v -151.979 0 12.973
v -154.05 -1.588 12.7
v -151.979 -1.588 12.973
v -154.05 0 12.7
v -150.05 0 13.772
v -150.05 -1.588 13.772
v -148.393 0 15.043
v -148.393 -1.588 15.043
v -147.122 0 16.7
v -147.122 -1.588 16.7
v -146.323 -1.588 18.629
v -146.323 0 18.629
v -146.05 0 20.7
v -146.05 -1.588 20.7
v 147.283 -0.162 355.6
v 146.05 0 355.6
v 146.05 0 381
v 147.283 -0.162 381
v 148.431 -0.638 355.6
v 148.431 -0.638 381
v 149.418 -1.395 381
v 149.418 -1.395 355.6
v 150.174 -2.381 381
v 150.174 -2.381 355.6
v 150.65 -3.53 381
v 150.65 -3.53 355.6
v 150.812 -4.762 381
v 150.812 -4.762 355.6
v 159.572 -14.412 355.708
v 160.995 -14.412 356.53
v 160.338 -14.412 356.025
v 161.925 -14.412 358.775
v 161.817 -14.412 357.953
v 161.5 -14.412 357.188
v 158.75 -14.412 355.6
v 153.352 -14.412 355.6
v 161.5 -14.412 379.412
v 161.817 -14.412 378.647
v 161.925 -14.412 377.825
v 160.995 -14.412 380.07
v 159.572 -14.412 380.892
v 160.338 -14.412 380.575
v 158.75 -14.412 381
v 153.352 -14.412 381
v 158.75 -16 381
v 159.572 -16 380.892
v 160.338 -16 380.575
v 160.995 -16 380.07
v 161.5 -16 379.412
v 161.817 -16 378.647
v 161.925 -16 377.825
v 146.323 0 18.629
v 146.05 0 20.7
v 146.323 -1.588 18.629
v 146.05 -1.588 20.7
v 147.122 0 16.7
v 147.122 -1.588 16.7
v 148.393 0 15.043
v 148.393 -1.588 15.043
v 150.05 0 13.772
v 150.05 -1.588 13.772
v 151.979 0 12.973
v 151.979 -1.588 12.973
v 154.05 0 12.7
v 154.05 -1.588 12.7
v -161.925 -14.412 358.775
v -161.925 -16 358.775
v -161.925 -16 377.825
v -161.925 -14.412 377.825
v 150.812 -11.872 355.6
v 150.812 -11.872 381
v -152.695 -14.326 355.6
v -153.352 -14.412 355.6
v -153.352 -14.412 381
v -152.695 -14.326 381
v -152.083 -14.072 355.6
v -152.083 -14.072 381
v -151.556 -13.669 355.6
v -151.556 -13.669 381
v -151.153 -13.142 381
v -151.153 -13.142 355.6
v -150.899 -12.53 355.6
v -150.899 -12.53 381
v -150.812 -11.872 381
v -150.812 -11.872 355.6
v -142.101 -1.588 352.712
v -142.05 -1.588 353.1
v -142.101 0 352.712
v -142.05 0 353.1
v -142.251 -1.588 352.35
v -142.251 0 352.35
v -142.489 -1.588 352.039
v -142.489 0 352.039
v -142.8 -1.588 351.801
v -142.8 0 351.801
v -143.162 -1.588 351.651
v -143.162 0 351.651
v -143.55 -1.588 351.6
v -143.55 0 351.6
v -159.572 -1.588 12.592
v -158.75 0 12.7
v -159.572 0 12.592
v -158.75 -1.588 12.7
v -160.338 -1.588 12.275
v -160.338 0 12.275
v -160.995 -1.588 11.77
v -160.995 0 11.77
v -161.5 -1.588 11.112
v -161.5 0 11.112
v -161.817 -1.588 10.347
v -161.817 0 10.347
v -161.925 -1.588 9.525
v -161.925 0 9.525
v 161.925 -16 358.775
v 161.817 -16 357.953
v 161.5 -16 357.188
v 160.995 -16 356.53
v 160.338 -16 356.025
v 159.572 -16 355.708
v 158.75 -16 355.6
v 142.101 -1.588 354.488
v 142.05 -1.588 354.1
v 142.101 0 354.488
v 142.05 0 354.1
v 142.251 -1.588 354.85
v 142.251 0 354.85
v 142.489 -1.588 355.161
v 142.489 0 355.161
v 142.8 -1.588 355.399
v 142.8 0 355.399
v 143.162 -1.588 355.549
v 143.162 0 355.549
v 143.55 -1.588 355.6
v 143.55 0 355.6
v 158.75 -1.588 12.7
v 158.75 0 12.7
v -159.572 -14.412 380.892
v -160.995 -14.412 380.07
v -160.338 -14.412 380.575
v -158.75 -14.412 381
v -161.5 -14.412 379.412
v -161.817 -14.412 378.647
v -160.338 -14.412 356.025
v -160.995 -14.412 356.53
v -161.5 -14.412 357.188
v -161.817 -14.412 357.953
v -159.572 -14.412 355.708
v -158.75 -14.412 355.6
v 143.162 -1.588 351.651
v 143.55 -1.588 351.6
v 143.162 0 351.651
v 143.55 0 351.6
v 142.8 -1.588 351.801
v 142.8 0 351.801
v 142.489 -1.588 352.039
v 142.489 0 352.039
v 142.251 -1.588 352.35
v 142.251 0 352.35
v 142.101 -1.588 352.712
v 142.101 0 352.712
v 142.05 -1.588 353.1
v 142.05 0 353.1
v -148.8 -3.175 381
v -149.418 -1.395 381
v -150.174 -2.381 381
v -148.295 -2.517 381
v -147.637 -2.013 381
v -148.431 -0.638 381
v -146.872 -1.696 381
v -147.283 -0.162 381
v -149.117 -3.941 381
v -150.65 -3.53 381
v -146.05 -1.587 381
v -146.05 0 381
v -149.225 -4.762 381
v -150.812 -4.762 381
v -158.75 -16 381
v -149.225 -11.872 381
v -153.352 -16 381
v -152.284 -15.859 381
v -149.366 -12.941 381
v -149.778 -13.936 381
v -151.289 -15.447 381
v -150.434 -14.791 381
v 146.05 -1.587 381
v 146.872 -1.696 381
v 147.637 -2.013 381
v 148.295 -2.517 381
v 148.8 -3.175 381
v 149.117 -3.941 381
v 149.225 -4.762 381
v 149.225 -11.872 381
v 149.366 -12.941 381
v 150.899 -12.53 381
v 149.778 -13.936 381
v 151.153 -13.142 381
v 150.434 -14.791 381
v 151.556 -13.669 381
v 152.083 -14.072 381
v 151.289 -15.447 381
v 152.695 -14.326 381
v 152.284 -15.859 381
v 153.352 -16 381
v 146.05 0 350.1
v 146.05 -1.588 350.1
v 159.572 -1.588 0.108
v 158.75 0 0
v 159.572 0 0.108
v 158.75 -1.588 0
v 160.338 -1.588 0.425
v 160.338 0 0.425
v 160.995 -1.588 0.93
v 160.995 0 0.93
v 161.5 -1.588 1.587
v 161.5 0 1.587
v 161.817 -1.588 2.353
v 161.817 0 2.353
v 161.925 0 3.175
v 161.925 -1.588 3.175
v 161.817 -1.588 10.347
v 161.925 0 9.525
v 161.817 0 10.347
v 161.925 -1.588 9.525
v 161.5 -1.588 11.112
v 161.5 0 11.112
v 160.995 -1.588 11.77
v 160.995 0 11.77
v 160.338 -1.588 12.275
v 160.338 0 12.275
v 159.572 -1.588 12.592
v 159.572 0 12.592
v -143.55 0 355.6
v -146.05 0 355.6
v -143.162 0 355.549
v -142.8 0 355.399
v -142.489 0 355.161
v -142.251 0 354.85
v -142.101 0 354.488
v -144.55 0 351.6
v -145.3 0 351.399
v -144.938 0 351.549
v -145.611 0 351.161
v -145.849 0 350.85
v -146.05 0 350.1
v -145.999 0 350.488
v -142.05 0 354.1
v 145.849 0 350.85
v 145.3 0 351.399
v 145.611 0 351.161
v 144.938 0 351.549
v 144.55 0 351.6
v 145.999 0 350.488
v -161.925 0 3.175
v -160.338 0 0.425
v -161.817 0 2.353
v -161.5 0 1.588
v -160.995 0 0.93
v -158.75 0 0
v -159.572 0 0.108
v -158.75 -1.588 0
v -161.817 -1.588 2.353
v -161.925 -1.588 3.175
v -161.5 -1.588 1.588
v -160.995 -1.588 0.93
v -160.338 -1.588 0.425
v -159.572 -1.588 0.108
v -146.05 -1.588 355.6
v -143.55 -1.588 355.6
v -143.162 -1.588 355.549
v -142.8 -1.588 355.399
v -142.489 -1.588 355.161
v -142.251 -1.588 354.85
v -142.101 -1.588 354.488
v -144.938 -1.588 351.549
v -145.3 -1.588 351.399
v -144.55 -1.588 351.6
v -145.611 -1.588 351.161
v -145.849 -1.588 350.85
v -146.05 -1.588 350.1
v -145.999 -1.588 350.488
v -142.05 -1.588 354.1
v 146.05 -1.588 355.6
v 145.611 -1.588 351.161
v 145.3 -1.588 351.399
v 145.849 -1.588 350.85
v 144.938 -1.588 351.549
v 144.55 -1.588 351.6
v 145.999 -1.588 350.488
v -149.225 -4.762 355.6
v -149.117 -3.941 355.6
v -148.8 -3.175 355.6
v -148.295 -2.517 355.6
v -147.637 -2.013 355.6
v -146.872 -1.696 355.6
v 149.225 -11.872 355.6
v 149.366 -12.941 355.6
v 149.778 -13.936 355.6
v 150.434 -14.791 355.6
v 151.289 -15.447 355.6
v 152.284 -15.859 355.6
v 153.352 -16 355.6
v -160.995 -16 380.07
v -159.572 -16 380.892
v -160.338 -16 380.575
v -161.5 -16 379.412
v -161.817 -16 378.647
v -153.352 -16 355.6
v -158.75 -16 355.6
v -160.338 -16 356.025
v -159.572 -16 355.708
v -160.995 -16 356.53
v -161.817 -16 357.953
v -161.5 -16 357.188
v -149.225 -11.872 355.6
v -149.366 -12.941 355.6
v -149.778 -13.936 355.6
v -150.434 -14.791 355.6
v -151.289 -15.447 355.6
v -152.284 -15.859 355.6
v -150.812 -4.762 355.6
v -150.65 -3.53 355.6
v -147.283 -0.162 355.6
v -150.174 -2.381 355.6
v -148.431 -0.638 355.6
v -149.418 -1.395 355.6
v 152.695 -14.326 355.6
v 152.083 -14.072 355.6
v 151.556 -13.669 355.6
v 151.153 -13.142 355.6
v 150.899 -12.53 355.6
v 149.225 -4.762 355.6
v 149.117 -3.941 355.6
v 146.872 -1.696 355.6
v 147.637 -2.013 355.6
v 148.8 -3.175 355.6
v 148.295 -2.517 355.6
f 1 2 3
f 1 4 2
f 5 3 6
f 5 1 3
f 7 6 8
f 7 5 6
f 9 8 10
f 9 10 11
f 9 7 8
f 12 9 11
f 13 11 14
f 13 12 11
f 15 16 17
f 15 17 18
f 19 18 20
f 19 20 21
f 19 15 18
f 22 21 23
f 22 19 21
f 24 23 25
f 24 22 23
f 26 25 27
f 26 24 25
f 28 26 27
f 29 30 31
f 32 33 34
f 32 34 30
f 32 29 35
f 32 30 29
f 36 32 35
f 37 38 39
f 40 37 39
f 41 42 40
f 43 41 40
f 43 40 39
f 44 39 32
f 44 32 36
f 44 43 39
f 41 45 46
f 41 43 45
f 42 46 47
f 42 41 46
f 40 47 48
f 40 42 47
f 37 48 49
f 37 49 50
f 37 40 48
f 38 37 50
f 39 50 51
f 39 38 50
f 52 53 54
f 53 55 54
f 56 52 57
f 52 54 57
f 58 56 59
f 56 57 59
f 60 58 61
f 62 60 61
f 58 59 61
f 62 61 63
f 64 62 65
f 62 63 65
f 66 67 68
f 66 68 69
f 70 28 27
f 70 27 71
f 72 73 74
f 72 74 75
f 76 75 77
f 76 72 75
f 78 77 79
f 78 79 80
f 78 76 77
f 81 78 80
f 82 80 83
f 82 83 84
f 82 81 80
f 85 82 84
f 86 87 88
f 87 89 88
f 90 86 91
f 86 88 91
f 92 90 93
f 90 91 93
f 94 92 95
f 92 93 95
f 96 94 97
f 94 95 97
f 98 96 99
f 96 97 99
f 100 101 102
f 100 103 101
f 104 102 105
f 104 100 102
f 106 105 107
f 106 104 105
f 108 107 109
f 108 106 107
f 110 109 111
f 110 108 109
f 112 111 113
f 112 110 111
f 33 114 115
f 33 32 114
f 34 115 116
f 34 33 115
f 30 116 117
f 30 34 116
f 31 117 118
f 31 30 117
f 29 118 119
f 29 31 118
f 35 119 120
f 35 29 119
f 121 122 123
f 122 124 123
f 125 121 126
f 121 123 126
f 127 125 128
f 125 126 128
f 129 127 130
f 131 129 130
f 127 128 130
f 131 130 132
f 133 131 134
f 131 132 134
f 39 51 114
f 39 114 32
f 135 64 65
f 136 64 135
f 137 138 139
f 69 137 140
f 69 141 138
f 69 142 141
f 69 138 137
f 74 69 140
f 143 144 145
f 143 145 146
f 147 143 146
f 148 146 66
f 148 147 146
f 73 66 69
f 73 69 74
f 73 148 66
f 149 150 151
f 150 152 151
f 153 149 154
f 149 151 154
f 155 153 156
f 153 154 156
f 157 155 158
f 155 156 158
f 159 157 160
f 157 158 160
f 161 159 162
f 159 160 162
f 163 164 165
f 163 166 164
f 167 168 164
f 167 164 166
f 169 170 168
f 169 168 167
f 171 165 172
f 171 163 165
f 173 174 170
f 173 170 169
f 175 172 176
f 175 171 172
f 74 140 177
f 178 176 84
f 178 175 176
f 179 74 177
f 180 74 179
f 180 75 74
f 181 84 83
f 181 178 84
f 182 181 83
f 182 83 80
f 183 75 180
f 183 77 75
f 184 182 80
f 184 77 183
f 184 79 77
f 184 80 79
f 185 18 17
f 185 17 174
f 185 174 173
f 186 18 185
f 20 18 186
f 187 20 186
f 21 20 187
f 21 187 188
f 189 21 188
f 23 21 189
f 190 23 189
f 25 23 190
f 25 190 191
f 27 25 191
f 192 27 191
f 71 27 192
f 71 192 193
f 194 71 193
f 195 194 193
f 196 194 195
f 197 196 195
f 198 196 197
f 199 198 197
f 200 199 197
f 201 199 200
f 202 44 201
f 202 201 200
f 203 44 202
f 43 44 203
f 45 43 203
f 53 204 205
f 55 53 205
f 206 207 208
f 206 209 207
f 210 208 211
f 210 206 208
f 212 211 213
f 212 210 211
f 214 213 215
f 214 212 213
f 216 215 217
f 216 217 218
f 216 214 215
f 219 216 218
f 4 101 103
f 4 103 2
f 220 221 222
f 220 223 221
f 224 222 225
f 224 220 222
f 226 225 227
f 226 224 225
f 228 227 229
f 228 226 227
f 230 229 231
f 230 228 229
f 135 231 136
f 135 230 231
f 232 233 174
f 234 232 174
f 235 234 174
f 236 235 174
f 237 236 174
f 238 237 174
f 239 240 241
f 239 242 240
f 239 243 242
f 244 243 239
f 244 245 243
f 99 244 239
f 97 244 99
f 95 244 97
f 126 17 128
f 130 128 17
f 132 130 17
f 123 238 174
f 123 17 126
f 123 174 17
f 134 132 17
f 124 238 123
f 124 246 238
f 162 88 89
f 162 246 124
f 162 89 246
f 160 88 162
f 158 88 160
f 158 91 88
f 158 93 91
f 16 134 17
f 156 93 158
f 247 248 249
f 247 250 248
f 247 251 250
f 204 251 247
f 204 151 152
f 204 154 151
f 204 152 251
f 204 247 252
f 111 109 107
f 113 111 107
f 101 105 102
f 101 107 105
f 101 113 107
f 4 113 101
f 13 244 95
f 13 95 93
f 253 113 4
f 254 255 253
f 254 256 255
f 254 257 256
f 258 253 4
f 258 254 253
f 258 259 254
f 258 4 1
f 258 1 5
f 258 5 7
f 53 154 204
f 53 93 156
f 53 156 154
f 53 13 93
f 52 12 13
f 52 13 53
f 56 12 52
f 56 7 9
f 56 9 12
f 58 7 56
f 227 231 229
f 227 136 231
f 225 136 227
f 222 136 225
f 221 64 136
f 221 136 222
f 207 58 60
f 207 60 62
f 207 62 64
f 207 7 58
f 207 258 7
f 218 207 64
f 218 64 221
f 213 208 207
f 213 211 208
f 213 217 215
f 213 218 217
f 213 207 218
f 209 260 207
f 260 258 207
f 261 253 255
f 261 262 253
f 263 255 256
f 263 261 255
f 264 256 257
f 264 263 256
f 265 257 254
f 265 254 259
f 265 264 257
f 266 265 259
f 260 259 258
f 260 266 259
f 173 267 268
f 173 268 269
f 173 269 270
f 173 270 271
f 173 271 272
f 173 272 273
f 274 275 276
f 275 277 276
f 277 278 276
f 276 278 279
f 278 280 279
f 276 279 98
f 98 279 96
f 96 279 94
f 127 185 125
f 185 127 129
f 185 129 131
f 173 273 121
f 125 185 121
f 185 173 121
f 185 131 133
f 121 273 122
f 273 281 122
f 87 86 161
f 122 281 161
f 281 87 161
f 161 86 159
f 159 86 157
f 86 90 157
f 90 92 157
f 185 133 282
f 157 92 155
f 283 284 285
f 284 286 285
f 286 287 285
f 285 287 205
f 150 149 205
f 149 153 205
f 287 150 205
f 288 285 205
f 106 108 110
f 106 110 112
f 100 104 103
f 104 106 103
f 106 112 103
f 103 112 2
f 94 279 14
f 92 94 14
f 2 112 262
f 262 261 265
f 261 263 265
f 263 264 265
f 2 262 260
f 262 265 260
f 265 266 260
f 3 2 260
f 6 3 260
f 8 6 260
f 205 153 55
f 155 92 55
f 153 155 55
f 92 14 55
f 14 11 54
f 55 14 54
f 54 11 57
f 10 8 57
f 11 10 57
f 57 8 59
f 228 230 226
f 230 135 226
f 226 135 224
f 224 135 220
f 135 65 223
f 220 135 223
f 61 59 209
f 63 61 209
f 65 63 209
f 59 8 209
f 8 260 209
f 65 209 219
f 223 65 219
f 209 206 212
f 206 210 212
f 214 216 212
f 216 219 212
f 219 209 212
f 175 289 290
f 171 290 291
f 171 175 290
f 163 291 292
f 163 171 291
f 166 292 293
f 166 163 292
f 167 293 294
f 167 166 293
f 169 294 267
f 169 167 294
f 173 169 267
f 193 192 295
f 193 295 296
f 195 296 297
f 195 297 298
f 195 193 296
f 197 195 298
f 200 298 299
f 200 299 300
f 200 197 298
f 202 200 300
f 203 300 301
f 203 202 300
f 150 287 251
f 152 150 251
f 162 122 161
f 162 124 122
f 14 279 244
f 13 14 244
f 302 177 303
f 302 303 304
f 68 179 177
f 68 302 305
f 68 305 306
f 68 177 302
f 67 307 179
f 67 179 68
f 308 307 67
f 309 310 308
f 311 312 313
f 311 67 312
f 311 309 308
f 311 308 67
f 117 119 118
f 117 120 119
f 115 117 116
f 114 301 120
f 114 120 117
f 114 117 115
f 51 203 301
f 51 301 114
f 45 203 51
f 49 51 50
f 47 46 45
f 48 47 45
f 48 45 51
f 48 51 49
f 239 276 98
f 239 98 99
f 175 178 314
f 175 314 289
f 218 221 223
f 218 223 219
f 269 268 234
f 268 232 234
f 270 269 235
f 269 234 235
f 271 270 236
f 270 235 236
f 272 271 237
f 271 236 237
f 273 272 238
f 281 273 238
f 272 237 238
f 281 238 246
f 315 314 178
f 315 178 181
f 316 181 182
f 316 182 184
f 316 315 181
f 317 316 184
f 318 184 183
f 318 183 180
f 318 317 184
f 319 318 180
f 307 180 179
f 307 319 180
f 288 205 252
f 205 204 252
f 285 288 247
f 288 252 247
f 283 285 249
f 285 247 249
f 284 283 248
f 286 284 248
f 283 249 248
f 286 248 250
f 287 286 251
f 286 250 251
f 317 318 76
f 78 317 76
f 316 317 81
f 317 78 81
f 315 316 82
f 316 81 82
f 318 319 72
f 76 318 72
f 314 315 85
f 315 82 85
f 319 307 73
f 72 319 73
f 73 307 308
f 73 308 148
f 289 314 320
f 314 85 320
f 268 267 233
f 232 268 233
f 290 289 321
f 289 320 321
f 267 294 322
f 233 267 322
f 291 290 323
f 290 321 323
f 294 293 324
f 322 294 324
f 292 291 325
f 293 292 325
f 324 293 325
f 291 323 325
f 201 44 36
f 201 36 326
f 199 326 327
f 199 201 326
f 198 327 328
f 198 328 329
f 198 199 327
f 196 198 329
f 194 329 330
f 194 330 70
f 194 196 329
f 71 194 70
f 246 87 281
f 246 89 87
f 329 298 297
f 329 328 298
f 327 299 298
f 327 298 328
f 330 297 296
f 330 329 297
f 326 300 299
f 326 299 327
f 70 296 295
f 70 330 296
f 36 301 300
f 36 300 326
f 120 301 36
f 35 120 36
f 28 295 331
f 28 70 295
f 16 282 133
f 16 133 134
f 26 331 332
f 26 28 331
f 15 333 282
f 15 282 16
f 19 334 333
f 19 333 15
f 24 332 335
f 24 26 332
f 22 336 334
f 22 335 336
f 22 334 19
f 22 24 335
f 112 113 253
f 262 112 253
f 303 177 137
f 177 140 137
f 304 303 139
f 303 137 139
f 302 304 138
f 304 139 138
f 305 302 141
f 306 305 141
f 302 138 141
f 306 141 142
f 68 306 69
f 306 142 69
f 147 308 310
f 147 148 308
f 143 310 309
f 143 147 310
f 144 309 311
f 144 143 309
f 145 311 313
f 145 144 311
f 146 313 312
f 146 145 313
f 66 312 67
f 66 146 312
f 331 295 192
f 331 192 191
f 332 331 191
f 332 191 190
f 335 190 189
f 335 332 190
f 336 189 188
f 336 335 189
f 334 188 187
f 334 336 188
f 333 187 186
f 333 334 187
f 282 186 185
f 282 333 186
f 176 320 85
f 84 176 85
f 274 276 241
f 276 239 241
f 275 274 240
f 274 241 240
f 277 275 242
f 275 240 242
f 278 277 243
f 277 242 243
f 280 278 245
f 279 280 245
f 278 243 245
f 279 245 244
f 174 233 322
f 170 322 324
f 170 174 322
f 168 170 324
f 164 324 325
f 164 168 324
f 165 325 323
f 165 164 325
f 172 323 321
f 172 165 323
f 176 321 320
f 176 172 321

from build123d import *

# Parameters (mm, degrees)
SKETCH5_W                      = 301.625
SKETCH5_H                      = 1.5875
BASE_FLANGE1_DEPTH             = 381
SKETCH10_W                     = 11.1125
SKETCH10_H                     = 12.7
BOSS_EXTRUDE1_DEPTH            = 1.5875
EDGE_FLANGE1_STRIP_W           = 12.7
EDGE_FLANGE1_STRIP_H           = 1.5875
EDGE_FLANGE1_STRIP_CUT_DEPTH   = 368.3
EDGE_FLANGE1_STRIP_2_W         = 12.7
EDGE_FLANGE1_STRIP_2_H         = 1.5875
EDGE_FLANGE1_STRIP_CUT_2_DEPTH = 368.3
EDGE_FLANGE1_DEPTH             = 368.3
EDGE_FLANGE1_BEND_DEPTH        = 368.3
CUT_EXTRUDE1_START             = -25.4
CUT_EXTRUDE1_DEPTH             = 342.9
EDGE_FLANGE2_STRIP_W           = 11.43
EDGE_FLANGE2_STRIP_H           = 1.5875
EDGE_FLANGE2_STRIP_CUT_DEPTH   = 25.4
EDGE_FLANGE2_DEPTH             = 25.4
EDGE_FLANGE3_STRIP_W           = 11.43
EDGE_FLANGE3_STRIP_H           = 1.5875
EDGE_FLANGE3_STRIP_CUT_DEPTH   = 25.4
EDGE_FLANGE3_DEPTH             = 25.4
FILLET1_R                      = 8
FILLET2_R                      = 3.175
SKETCH30_W                     = 4
SKETCH30_H                     = 1.5875
CUT_EXTRUDE9_DEPTH             = 4
SKETCH31_W                     = 4
SKETCH31_H                     = 1.5875
CUT_EXTRUDE10_DEPTH            = 4
FILLET4_R                      = 1.5


# Sheet-metal steps are written as plain solids
with BuildPart() as part:
    # Sketch5 → Base-Flange1 (new body)
    with BuildSketch(Plane.XY):
        with Locations((0, -0.79375)):
            Rectangle(SKETCH5_W, SKETCH5_H)
    extrude(amount=BASE_FLANGE1_DEPTH)

    # Sketch10 → Boss-Extrude1 (add)
    with BuildSketch(Plane(origin=(0, 0, 0), x_dir=(1, 0, 0), z_dir=(0, 1, 0))):
        with Locations((-156.36875, -6.35)):
            Rectangle(SKETCH10_W, SKETCH10_H)
        with Locations((156.36875, -6.35)):
            Rectangle(SKETCH10_W, SKETCH10_H)
    extrude(amount=-BOSS_EXTRUDE1_DEPTH)

    # Edge-Flange1 strip (across the edge) → Edge-Flange1 strip cut (cut)
    with BuildSketch(Plane(origin=(150.8125, -1.5875, 12.7), x_dir=(-1, 0, 0), z_dir=(0, 0, 1))):
        with Locations((-1.5875, -0.79375)):
            Rectangle(EDGE_FLANGE1_STRIP_W, EDGE_FLANGE1_STRIP_H)
    extrude(amount=EDGE_FLANGE1_STRIP_CUT_DEPTH, mode=Mode.SUBTRACT)

    # Edge-Flange1 strip 2 (across the edge) → Edge-Flange1 strip cut 2 (cut)
    with BuildSketch(Plane(origin=(-150.8125, -1.5875, 381), x_dir=(1, 0, 0), z_dir=(0, 0, -1))):
        with Locations((-1.5875, -0.79375)):
            Rectangle(EDGE_FLANGE1_STRIP_2_W, EDGE_FLANGE1_STRIP_2_H)
    extrude(amount=EDGE_FLANGE1_STRIP_CUT_2_DEPTH, mode=Mode.SUBTRACT)

    # Edge-Flange1 section (across the edge) → Edge-Flange1 (add)
    with BuildSketch(Plane(origin=(150.8125, -1.5875, 12.7), x_dir=(-1, 0, 0), z_dir=(0, 0, 1))):
        with BuildLine():
            Line((0, 3.175), (0, 14.4125))
            Line((0, 14.4125), (1.5875, 14.4125))
            Line((1.5875, 14.4125), (1.5875, 3.175))
            ThreePointArc((1.5875, 3.175), (2.51743597, 0.92993597), (4.7625, 0))
            Line((4.7625, 0), (4.7625, -1.5875))
            ThreePointArc((4.7625, -1.5875), (1.394903955, -0.192596045), (0, 3.175))
        make_face()
    extrude(amount=EDGE_FLANGE1_DEPTH)

    # Edge-Flange1 section 2 (across the edge) → Edge-Flange1 bend (add)
    with BuildSketch(Plane(origin=(-150.8125, -1.5875, 381), x_dir=(1, 0, 0), z_dir=(0, 0, -1))):
        with BuildLine():
            Line((0, 3.175), (0, 14.4125))
            Line((0, 14.4125), (1.5875, 14.4125))
            Line((1.5875, 14.4125), (1.5875, 3.175))
            ThreePointArc((1.5875, 3.175), (2.51743597, 0.92993597), (4.7625, 0))
            Line((4.7625, 0), (4.7625, -1.5875))
            ThreePointArc((4.7625, -1.5875), (1.394903955, -0.192596045), (0, 3.175))
        make_face()
    extrude(amount=EDGE_FLANGE1_BEND_DEPTH)

    # Sketch20 → Cut-Extrude1 (cut)
    with BuildSketch(Plane.XY.offset(381).offset(CUT_EXTRUDE1_START)):
        with BuildLine():
            Line((-150.8125, -4.7625), (-150.8125, -16))
            Line((-150.8125, -16), (-149.225, -16))
            Line((-149.225, -16), (-149.225, -4.7625))
            ThreePointArc((-149.225, -4.7625), (-148.29506403, -2.51743597), (-146.05, -1.5875))
            Line((-146.05, -1.5875), (-146.05, 0))
            ThreePointArc((-146.05, 0), (-149.417596045, -1.394903955), (-150.8125, -4.7625))
        make_face()
        with BuildLine():
            Line((149.225, -4.7625), (149.225, -16))
            Line((149.225, -16), (150.8125, -16))
            Line((150.8125, -16), (150.8125, -4.7625))
            ThreePointArc((150.8125, -4.7625), (149.417596045, -1.394903955), (146.05, 0))
            Line((146.05, 0), (146.05, -1.5875))
            ThreePointArc((146.05, -1.5875), (148.29506403, -2.51743597), (149.225, -4.7625))
        make_face()
    extrude(amount=-CUT_EXTRUDE1_DEPTH, mode=Mode.SUBTRACT)

    # Edge-Flange2 strip (across the edge) → Edge-Flange2 strip cut (cut)
    with BuildSketch(Plane(origin=(-150.8125, -16, 355.6), x_dir=(0, 1, 0), z_dir=(0, 0, 1))):
        with Locations((-1.5875, -0.79375)):
            Rectangle(EDGE_FLANGE2_STRIP_W, EDGE_FLANGE2_STRIP_H)
    extrude(amount=EDGE_FLANGE2_STRIP_CUT_DEPTH, mode=Mode.SUBTRACT)

    # Edge-Flange2 section (across the edge) → Edge-Flange2 (add)
    with BuildSketch(Plane(origin=(-150.8125, -16, 355.6), x_dir=(0, 1, 0), z_dir=(0, 0, 1))):
        with BuildLine():
            Line((0, 2.54), (0, 11.1125))
            Line((0, 11.1125), (1.5875, 11.1125))
            Line((1.5875, 11.1125), (1.5875, 2.54))
            ThreePointArc((1.5875, 2.54), (2.331448776, 0.743948776), (4.1275, 0))
            Line((4.1275, 0), (4.1275, -1.5875))
            ThreePointArc((4.1275, -1.5875), (1.208916761, -0.378583239), (0, 2.54))
        make_face()
    extrude(amount=EDGE_FLANGE2_DEPTH)

    # Edge-Flange3 strip (across the edge) → Edge-Flange3 strip cut (cut)
    with BuildSketch(Plane(origin=(150.8125, -16, 381), x_dir=(0, 1, 0), z_dir=(0, 0, -1))):
        with Locations((-1.5875, -0.79375)):
            Rectangle(EDGE_FLANGE3_STRIP_W, EDGE_FLANGE3_STRIP_H)
    extrude(amount=EDGE_FLANGE3_STRIP_CUT_DEPTH, mode=Mode.SUBTRACT)

    # Edge-Flange3 section (across the edge) → Edge-Flange3 (add)
    with BuildSketch(Plane(origin=(150.8125, -16, 381), x_dir=(0, 1, 0), z_dir=(0, 0, -1))):
        with BuildLine():
            Line((0, 2.54), (0, 11.1125))
            Line((0, 11.1125), (1.5875, 11.1125))
            Line((1.5875, 11.1125), (1.5875, 2.54))
            ThreePointArc((1.5875, 2.54), (2.331448776, 0.743948776), (4.1275, 0))
            Line((4.1275, 0), (4.1275, -1.5875))
            ThreePointArc((4.1275, -1.5875), (1.208916761, -0.378583239), (0, 2.54))
        make_face()
    extrude(amount=EDGE_FLANGE3_DEPTH)

    # Fillet1
    fillet1_edges = [part.edges().sort_by_distance(p)[0] for p in [
        (-146.05, -0.79375, 12.7),
        (146.05, -0.79375, 12.7),
    ]]
    fillet(fillet1_edges, radius=FILLET1_R)

    # Fillet2
    fillet2_edges = [part.edges().sort_by_distance(p)[0] for p in [
        (-161.925, -0.79375, 12.7),
        (-161.925, -0.79375, 0),
        (-161.925, -15.20625, 355.6),
        (-161.925, -15.20625, 381),
        (161.925, -15.20625, 381),
        (161.925, -15.20625, 355.6),
        (161.925, -0.79375, 0),
        (161.925, -0.79375, 12.7),
    ]]
    fillet(fillet2_edges, radius=FILLET2_R)

    # Sketch30 → Cut-Extrude9 (cut)
    with BuildSketch(Plane.ZY.offset(146.05)):
        with Locations((353.6, -0.79375)):
            Rectangle(SKETCH30_W, SKETCH30_H)
    extrude(amount=-CUT_EXTRUDE9_DEPTH, mode=Mode.SUBTRACT)

    # Sketch31 → Cut-Extrude10 (cut)
    with BuildSketch(Plane(origin=(146.05, 0, 0), x_dir=(0, 0, -1), z_dir=(1, 0, 0))):
        with Locations((-353.6, -0.79375)):
            Rectangle(SKETCH31_W, SKETCH31_H)
    extrude(amount=-CUT_EXTRUDE10_DEPTH, mode=Mode.SUBTRACT)

    # Fillet4
    fillet4_edges = [part.edges().sort_by_distance(p)[0] for p in [
        (-146.05, -0.79375, 351.6),
        (-142.05, -0.79375, 351.6),
        (-142.05, -0.79375, 355.6),
        (146.05, -0.79375, 351.6),
        (142.05, -0.79375, 351.6),
        (142.05, -0.79375, 355.6),
    ]]
    fillet(fillet4_edges, radius=FILLET4_R)


solid = part.part
